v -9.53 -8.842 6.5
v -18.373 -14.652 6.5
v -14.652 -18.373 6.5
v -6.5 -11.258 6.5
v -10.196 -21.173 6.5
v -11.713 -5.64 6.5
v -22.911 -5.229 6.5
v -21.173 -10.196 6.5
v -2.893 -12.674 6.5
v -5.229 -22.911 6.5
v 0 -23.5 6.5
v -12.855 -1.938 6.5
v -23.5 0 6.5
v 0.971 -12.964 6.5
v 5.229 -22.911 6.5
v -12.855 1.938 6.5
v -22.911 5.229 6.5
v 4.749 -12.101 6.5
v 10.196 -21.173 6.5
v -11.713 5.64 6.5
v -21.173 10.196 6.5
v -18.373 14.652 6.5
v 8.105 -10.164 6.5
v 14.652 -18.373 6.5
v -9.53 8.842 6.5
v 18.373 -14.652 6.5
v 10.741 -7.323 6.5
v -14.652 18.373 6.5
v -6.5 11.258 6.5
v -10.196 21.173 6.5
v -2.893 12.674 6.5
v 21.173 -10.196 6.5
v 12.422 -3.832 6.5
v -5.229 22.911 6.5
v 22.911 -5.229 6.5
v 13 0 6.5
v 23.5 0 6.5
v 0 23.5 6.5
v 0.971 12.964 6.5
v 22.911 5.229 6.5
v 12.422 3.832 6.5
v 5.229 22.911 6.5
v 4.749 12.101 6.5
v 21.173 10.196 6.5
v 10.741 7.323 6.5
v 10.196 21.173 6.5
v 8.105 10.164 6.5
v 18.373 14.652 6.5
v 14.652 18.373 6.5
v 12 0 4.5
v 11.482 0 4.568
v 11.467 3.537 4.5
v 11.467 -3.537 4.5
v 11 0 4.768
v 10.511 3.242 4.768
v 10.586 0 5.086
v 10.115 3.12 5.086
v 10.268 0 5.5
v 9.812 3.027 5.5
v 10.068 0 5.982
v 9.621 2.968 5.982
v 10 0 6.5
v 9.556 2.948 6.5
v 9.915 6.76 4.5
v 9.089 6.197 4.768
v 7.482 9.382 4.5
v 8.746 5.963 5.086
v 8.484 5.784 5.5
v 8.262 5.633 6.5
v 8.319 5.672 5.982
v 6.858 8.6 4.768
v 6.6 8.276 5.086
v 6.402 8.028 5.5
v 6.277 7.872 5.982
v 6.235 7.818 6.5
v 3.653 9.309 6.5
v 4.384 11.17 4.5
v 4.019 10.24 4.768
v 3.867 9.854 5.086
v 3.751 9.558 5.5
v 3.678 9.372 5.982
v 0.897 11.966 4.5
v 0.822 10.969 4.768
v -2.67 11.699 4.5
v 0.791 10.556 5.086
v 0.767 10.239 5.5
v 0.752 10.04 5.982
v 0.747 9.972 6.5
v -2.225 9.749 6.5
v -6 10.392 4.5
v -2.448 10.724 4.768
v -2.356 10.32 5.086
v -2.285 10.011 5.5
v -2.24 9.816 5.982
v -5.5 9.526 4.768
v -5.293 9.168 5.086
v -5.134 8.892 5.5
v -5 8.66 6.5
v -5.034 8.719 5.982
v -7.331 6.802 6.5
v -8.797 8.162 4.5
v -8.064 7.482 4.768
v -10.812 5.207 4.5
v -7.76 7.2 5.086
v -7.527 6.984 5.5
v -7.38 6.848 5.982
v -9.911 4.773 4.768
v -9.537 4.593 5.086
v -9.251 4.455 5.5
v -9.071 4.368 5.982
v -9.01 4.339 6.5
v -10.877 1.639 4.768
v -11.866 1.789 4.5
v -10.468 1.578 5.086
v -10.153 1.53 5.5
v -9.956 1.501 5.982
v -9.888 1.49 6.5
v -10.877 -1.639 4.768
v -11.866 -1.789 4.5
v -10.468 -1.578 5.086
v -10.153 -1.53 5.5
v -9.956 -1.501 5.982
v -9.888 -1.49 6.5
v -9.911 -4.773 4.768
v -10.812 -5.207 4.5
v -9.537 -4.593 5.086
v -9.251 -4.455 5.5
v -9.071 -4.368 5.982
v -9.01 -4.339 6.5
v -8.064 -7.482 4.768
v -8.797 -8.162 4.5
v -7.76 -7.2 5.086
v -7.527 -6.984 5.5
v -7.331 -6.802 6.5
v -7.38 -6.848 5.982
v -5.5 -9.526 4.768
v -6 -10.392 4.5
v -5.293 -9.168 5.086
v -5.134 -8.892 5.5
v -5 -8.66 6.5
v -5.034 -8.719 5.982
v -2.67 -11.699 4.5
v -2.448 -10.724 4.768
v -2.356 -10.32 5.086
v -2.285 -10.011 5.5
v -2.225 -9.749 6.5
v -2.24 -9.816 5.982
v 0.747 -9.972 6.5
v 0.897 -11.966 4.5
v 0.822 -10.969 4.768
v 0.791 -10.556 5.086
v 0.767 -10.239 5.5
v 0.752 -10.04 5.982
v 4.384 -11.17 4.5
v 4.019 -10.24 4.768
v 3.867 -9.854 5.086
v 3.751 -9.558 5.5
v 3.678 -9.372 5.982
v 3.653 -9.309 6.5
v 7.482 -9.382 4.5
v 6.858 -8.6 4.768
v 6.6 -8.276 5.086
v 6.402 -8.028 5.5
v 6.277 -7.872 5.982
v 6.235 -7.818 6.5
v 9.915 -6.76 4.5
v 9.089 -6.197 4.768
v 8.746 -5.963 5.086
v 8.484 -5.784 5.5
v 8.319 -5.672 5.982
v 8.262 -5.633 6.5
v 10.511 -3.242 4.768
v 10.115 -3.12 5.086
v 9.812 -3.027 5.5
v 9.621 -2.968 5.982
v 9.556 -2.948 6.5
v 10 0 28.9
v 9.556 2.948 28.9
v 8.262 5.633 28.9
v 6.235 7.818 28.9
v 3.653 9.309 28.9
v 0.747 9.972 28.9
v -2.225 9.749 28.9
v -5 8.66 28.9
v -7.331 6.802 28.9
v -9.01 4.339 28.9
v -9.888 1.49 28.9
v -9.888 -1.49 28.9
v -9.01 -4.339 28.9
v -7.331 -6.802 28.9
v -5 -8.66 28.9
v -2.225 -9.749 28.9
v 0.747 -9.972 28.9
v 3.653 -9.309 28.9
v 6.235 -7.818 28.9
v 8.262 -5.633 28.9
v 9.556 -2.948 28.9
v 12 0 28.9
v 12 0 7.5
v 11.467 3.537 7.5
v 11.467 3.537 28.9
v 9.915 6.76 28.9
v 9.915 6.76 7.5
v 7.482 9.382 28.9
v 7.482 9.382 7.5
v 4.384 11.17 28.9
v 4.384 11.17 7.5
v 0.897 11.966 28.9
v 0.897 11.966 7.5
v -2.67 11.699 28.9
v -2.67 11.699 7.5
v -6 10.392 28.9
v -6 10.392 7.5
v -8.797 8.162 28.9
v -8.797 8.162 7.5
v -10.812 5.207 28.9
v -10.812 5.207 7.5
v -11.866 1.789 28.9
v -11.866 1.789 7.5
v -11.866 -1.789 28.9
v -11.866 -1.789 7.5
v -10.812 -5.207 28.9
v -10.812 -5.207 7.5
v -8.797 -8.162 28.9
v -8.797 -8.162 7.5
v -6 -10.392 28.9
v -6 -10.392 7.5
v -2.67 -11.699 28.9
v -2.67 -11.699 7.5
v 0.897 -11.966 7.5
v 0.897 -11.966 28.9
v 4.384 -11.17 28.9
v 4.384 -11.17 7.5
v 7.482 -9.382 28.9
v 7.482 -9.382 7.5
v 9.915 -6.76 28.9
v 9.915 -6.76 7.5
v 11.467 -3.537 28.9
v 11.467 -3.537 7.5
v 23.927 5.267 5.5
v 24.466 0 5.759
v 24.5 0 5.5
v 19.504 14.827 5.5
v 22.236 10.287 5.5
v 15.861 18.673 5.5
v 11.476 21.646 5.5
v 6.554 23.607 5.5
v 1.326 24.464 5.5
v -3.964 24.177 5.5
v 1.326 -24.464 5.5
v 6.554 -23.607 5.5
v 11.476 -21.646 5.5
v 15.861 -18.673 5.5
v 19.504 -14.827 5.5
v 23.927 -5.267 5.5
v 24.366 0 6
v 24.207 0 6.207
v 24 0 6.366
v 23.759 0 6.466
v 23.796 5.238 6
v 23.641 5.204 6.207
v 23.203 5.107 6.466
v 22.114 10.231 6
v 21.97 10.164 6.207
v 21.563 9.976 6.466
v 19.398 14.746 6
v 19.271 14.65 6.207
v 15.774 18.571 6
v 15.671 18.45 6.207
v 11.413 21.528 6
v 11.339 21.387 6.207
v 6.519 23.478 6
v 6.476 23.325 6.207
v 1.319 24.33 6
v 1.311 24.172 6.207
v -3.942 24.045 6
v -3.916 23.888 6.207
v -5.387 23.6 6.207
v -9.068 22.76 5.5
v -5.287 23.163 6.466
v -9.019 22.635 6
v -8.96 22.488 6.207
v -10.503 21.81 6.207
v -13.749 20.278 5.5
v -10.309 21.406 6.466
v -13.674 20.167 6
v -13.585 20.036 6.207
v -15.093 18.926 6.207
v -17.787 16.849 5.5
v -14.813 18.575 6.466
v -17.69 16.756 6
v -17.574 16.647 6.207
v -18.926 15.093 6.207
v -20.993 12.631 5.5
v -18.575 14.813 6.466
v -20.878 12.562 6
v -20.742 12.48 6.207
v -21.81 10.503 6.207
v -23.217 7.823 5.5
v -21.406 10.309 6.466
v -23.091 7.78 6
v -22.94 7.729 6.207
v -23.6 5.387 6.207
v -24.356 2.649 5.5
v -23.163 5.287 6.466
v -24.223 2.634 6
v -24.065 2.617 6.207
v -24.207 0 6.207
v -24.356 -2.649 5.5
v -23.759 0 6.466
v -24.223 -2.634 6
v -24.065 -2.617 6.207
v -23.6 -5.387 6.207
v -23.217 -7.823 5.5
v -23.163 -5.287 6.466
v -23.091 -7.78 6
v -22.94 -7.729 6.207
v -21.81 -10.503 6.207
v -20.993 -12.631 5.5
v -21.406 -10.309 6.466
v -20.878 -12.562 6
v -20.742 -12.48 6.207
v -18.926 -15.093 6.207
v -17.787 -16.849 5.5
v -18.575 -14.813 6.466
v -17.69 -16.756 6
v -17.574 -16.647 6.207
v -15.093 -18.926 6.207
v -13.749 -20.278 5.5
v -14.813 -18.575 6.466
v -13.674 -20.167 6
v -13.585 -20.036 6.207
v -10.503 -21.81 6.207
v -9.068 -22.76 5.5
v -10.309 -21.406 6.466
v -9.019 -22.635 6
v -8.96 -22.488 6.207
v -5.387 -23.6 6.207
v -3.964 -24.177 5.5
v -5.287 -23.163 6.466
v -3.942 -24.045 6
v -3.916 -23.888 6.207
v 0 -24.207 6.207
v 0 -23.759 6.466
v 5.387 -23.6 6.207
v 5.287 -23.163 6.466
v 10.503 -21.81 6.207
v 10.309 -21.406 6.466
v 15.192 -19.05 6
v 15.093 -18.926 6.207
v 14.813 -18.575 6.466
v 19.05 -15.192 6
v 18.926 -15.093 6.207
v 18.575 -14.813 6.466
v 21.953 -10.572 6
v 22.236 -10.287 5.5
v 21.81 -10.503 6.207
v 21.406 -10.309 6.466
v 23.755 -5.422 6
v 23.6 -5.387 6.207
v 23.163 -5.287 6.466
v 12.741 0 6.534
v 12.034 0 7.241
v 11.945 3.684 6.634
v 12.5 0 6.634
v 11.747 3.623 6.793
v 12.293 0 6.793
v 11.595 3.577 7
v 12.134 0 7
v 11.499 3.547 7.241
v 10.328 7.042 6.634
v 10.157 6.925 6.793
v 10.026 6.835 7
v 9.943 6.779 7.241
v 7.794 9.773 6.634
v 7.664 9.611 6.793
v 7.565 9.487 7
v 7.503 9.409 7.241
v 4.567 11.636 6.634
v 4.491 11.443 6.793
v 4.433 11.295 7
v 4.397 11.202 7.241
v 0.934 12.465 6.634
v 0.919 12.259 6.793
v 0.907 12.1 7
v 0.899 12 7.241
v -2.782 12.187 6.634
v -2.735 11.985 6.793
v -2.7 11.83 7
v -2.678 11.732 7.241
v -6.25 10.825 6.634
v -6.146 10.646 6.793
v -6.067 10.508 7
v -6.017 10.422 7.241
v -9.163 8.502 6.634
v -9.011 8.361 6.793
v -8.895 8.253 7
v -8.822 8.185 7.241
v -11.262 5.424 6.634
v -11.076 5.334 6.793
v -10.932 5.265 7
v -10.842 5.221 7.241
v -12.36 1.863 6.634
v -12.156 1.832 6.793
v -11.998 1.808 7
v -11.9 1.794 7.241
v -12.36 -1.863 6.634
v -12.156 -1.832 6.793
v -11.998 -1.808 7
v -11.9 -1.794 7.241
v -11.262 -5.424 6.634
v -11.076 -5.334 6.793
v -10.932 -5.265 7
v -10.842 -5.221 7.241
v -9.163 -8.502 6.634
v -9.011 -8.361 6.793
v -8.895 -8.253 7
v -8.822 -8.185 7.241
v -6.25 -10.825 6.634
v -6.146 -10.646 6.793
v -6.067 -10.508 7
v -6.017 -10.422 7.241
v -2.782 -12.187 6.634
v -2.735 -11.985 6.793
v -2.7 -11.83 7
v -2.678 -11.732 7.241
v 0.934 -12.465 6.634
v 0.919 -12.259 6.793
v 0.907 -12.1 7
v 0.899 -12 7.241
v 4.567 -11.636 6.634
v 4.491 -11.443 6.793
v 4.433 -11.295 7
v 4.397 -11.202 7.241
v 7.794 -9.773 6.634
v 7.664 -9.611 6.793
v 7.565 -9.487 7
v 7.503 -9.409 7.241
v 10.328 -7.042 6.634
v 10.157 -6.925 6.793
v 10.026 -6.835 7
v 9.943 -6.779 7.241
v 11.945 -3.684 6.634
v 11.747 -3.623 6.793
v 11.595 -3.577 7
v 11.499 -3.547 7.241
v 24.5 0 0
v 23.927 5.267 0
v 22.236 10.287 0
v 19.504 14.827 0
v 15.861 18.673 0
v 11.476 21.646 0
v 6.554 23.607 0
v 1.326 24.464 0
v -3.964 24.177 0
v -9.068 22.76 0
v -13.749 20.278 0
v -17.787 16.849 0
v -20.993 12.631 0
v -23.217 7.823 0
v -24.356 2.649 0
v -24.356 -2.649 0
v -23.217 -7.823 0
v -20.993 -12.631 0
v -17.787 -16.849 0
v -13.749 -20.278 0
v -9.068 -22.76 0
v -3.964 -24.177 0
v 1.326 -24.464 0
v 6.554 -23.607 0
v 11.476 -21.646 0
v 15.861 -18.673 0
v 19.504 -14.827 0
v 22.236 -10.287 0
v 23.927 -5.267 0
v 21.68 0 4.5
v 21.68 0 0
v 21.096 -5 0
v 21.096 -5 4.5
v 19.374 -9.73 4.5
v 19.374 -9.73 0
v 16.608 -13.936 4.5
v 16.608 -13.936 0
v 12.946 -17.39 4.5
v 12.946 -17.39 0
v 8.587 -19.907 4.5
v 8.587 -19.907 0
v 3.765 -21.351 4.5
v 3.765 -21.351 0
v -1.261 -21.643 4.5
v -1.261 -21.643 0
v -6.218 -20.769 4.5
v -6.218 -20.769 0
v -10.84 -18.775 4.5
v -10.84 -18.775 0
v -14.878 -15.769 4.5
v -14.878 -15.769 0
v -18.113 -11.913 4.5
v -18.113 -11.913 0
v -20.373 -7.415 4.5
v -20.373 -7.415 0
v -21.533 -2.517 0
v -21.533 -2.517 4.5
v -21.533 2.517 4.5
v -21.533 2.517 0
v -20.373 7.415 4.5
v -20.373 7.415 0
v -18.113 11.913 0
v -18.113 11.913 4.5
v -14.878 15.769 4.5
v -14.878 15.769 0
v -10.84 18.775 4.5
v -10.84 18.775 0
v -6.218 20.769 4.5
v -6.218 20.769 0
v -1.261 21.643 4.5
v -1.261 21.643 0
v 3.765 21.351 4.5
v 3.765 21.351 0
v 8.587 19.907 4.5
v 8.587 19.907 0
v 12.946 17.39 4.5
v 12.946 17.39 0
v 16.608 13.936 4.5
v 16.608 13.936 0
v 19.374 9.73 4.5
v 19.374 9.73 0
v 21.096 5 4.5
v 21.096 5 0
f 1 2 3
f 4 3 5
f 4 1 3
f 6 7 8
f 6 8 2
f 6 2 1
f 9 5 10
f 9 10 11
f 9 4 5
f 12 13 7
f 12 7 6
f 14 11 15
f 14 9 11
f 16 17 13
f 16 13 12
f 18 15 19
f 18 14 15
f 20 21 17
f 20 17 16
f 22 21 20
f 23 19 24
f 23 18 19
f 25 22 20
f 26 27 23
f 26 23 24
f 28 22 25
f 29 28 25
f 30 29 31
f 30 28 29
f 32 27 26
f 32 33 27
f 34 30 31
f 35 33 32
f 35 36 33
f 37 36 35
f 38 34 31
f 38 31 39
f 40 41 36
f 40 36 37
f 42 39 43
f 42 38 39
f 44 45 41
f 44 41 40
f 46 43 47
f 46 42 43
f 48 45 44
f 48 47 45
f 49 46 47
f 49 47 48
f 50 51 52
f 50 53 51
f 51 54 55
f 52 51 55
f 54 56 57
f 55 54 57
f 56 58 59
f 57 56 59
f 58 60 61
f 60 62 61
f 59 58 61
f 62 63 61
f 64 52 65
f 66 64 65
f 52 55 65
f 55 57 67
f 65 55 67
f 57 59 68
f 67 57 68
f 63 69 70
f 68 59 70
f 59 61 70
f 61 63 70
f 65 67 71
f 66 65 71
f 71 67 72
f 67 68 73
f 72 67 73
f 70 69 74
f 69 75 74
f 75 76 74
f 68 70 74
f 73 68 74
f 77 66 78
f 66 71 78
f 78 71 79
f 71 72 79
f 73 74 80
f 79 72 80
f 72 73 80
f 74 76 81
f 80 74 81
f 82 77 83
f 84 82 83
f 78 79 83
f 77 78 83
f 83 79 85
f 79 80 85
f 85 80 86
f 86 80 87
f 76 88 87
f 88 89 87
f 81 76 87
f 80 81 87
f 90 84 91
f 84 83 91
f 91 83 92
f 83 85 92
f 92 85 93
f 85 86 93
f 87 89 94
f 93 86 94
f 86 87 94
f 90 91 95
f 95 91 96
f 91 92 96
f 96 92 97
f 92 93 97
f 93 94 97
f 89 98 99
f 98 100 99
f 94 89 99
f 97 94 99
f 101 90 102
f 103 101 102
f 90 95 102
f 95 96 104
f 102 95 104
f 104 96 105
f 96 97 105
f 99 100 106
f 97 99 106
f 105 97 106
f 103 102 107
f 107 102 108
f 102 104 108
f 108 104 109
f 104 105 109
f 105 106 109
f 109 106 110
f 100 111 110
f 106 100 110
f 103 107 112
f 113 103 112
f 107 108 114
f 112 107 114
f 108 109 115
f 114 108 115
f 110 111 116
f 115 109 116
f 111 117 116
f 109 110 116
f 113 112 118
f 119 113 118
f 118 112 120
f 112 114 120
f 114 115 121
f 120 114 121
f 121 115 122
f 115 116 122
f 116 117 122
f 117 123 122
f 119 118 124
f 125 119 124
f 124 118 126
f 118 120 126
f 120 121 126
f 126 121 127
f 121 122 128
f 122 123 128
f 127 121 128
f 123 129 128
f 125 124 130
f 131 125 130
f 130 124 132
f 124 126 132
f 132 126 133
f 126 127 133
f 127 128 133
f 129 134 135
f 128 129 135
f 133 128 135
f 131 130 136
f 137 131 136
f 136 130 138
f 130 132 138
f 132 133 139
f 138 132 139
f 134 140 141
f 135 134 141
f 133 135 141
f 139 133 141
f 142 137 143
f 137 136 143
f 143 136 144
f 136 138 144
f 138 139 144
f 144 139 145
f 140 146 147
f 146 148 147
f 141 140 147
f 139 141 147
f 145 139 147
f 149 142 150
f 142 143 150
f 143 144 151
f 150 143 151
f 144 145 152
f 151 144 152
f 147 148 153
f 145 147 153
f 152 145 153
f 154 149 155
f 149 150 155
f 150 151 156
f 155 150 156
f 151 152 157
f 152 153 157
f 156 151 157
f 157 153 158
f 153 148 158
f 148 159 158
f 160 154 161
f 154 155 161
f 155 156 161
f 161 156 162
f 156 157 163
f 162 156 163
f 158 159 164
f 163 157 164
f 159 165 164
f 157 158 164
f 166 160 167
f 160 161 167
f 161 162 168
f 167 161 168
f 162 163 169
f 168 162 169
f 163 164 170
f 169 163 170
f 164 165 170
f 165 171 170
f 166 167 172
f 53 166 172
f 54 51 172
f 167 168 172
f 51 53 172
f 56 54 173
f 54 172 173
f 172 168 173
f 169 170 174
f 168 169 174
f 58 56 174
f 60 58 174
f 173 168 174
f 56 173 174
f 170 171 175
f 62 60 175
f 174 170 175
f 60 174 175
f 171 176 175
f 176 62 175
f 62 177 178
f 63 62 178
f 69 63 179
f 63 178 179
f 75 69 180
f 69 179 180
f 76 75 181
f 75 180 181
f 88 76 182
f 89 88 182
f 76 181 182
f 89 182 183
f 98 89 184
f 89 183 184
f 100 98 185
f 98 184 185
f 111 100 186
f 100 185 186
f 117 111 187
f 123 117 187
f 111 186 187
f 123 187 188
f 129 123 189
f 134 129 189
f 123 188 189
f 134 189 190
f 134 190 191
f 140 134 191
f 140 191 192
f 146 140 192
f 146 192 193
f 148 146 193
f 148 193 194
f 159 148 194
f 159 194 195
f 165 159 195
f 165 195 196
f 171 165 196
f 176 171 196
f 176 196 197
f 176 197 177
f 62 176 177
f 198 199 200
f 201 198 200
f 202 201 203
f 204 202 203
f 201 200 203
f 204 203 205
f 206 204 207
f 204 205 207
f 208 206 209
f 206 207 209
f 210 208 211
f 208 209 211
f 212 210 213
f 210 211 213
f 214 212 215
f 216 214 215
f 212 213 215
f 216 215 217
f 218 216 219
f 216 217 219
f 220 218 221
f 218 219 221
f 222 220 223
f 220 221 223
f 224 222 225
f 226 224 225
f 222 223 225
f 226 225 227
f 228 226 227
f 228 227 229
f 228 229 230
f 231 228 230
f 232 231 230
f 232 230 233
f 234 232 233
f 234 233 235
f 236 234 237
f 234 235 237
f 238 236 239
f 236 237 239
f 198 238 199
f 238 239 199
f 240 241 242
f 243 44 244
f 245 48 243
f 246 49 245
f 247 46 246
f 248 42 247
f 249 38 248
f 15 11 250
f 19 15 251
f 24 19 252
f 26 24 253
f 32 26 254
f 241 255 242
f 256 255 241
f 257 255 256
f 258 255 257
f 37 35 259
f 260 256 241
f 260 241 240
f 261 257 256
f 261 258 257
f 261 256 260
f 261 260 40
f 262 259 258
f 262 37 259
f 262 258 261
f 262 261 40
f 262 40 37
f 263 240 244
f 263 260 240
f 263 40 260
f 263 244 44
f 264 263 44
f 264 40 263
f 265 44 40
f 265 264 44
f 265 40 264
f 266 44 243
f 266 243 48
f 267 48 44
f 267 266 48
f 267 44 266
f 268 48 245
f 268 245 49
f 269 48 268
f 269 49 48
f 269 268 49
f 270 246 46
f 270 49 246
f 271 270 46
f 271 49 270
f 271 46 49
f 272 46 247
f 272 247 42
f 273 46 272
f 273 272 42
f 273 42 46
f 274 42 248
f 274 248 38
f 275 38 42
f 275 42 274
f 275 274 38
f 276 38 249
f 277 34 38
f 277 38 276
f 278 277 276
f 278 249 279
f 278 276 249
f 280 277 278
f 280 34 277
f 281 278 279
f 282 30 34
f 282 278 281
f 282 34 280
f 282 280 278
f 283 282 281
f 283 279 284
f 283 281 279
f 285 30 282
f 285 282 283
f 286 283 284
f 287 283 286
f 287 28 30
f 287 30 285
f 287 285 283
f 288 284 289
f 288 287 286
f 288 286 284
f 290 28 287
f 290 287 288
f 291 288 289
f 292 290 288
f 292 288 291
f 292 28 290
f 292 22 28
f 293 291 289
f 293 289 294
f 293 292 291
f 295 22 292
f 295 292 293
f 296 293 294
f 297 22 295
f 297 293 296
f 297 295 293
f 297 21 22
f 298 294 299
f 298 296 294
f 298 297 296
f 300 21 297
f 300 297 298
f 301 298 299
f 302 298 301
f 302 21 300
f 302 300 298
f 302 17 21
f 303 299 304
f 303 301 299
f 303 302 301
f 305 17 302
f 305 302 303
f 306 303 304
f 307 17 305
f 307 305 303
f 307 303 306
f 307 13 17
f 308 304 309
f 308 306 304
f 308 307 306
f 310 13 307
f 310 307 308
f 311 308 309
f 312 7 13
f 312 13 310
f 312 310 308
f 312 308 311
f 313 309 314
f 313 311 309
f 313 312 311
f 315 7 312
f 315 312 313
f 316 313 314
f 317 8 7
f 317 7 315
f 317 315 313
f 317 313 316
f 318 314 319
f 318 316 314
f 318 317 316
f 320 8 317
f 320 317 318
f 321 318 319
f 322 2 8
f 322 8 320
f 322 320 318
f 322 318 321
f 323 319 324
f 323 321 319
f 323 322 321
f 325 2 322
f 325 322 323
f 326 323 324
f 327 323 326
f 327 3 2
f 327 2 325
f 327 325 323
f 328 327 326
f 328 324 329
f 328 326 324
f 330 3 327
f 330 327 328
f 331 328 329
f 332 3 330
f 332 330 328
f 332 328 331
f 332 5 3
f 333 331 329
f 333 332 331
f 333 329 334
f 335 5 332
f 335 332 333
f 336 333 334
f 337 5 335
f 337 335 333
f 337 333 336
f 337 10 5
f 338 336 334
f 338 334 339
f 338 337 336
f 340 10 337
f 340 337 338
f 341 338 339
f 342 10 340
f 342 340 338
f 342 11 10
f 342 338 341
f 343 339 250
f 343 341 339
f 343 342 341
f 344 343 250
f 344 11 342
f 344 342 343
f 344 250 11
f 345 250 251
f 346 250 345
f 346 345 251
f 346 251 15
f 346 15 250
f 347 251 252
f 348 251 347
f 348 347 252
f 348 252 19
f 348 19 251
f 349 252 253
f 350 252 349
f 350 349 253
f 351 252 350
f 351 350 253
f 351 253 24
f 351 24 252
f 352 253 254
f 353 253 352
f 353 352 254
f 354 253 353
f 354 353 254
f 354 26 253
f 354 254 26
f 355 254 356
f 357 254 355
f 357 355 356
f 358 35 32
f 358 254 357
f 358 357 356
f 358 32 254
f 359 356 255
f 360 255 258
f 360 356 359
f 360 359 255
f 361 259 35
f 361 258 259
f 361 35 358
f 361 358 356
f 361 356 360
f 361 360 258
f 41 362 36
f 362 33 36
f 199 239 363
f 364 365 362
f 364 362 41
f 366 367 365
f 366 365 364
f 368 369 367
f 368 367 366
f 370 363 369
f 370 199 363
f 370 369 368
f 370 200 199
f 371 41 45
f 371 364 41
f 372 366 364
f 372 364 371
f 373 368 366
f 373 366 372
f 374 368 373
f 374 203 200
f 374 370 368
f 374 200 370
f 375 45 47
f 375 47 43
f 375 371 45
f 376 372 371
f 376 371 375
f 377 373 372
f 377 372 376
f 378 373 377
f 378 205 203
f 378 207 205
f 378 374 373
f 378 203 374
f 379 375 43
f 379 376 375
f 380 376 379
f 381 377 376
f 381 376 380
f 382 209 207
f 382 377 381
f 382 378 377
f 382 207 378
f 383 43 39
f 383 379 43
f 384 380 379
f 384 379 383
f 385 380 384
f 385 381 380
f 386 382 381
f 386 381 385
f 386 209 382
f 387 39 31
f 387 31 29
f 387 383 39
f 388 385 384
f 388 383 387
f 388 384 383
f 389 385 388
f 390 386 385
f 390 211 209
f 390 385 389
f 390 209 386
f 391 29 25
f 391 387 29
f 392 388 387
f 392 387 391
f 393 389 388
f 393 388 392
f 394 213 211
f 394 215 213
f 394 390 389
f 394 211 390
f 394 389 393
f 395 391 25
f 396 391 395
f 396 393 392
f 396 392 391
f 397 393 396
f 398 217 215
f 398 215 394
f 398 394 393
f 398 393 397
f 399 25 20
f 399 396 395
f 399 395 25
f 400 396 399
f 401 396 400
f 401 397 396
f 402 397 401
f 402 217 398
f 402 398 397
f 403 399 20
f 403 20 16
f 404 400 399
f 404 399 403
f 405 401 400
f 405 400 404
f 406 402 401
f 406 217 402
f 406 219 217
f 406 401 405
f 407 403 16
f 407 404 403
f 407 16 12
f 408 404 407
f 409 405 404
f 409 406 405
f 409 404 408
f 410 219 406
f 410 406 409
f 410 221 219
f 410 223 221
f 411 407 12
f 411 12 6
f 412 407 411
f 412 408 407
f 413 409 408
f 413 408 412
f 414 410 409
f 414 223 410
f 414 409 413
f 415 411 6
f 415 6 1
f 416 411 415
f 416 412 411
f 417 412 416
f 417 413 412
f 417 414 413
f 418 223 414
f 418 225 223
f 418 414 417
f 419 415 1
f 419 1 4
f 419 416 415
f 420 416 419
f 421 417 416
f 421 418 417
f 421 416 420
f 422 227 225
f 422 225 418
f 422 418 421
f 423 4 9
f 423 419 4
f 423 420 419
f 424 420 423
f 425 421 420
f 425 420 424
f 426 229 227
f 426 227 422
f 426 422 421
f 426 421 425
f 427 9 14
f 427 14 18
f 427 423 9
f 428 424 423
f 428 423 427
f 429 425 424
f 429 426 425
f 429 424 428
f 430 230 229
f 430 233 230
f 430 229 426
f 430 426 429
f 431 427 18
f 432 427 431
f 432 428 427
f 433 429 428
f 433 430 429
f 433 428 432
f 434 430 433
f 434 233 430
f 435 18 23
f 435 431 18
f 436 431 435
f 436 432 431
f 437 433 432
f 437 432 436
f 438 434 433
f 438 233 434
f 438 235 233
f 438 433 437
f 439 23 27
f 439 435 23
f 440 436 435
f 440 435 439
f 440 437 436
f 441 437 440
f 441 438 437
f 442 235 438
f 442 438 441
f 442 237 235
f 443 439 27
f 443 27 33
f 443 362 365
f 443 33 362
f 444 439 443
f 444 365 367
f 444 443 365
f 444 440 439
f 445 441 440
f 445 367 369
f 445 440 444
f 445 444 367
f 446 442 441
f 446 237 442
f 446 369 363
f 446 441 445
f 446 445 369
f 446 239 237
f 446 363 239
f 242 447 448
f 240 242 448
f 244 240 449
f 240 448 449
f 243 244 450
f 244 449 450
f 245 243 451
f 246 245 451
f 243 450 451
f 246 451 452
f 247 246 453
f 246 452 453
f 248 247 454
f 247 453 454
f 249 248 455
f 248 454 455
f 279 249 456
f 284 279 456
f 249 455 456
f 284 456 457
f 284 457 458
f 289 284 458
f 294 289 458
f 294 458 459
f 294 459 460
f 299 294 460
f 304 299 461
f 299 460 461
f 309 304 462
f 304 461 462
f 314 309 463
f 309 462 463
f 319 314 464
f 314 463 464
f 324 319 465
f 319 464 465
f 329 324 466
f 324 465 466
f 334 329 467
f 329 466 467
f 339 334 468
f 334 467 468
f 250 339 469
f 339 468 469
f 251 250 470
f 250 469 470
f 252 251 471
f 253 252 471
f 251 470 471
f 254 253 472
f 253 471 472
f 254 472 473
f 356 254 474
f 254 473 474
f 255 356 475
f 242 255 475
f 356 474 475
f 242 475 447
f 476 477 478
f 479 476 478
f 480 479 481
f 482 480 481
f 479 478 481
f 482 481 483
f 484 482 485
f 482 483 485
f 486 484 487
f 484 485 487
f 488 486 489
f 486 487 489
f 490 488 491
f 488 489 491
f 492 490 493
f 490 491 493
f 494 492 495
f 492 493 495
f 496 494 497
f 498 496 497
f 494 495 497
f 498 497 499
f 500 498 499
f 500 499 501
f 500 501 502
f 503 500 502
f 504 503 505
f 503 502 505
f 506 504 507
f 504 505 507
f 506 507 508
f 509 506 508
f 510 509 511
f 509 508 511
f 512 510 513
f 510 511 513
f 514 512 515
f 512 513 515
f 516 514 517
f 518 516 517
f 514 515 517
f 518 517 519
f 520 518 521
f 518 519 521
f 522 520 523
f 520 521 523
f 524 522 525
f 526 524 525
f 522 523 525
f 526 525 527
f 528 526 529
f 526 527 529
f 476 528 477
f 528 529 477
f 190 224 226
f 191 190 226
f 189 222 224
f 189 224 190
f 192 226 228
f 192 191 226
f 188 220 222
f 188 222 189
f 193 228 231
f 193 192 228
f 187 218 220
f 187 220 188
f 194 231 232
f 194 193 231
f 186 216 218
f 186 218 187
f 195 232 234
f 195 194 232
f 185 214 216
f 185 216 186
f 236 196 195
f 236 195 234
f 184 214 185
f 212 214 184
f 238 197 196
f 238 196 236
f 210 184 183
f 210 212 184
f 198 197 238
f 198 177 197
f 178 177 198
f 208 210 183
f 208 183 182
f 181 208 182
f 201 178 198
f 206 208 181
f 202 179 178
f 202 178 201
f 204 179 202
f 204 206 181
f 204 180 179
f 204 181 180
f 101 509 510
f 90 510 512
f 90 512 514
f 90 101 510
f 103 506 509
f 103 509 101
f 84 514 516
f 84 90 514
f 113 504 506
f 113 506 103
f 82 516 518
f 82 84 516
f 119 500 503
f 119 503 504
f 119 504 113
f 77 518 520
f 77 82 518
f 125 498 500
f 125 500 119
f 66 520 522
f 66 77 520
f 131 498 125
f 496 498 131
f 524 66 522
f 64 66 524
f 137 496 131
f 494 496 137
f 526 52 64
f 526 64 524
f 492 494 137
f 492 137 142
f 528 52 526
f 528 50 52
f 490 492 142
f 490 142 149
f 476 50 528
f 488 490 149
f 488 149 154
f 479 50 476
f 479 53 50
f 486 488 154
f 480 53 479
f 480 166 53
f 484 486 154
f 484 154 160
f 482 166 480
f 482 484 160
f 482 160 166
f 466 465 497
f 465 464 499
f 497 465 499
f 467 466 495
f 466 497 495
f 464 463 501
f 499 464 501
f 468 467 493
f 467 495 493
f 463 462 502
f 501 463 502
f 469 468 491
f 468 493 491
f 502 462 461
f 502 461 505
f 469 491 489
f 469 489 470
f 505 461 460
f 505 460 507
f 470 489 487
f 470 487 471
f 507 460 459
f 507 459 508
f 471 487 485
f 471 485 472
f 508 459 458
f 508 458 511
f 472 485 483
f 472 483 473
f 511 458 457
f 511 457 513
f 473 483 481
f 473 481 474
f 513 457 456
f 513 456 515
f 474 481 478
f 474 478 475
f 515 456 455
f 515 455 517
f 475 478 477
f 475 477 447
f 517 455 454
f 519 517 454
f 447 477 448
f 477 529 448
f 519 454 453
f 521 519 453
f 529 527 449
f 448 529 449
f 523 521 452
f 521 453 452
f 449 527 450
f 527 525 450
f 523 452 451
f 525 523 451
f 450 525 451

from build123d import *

# Parameters (mm, degrees)
SKETCH_R        = 24.499989
PAD_DEPTH       = 6.5
SKETCH001_R     = 12
PAD001_DEPTH    = 22.4
SKETCH002_R     = 10
POCKET_DEPTH    = 30
SKETCH003_R     = 21.680004
POCKET001_DEPTH = 4.5
FILLET_R        = 2
FILLET001_R     = 1
FILLET002_R     = 1


with BuildPart() as part:
    # Sketch → Pad (new body)
    with BuildSketch(Plane.XY):
        Circle(SKETCH_R)
    extrude(amount=PAD_DEPTH)

    # Sketch001 (on Face3 of Pad) → Pad001 (join)
    with BuildSketch(Plane.XY.offset(6.5)):
        Circle(SKETCH001_R)
    extrude(amount=PAD001_DEPTH)

    # Sketch002 (on Face5 of Pad001) → Pocket (cut)
    with BuildSketch(Plane.XY.offset(28.9)):
        Circle(SKETCH002_R)
    extrude(amount=-POCKET_DEPTH, mode=Mode.SUBTRACT)

    # Sketch003 (on Face2 of Pocket) → Pocket001 (cut)
    with BuildSketch(Plane(origin=(0, 0, 0), x_dir=(1, 0, 0), z_dir=(0, 0, -1))):
        Circle(SKETCH003_R)
    extrude(amount=-POCKET001_DEPTH, mode=Mode.SUBTRACT)

    # Fillet
    fillet_edges = [part.edges().sort_by_distance(p)[0] for p in [
        (-10, 0, 4.5),
    ]]
    fillet(fillet_edges, radius=FILLET_R)

    # Fillet001
    fillet001_edges = [part.edges().sort_by_distance(p)[0] for p in [
        (-24.499989, 0, 6.5),
    ]]
    fillet(fillet001_edges, radius=FILLET001_R)

    # Fillet002
    fillet002_edges = [part.edges().sort_by_distance(p)[0] for p in [
        (-12, 0, 6.5),
    ]]
    fillet(fillet002_edges, radius=FILLET002_R)


solid = part.part
